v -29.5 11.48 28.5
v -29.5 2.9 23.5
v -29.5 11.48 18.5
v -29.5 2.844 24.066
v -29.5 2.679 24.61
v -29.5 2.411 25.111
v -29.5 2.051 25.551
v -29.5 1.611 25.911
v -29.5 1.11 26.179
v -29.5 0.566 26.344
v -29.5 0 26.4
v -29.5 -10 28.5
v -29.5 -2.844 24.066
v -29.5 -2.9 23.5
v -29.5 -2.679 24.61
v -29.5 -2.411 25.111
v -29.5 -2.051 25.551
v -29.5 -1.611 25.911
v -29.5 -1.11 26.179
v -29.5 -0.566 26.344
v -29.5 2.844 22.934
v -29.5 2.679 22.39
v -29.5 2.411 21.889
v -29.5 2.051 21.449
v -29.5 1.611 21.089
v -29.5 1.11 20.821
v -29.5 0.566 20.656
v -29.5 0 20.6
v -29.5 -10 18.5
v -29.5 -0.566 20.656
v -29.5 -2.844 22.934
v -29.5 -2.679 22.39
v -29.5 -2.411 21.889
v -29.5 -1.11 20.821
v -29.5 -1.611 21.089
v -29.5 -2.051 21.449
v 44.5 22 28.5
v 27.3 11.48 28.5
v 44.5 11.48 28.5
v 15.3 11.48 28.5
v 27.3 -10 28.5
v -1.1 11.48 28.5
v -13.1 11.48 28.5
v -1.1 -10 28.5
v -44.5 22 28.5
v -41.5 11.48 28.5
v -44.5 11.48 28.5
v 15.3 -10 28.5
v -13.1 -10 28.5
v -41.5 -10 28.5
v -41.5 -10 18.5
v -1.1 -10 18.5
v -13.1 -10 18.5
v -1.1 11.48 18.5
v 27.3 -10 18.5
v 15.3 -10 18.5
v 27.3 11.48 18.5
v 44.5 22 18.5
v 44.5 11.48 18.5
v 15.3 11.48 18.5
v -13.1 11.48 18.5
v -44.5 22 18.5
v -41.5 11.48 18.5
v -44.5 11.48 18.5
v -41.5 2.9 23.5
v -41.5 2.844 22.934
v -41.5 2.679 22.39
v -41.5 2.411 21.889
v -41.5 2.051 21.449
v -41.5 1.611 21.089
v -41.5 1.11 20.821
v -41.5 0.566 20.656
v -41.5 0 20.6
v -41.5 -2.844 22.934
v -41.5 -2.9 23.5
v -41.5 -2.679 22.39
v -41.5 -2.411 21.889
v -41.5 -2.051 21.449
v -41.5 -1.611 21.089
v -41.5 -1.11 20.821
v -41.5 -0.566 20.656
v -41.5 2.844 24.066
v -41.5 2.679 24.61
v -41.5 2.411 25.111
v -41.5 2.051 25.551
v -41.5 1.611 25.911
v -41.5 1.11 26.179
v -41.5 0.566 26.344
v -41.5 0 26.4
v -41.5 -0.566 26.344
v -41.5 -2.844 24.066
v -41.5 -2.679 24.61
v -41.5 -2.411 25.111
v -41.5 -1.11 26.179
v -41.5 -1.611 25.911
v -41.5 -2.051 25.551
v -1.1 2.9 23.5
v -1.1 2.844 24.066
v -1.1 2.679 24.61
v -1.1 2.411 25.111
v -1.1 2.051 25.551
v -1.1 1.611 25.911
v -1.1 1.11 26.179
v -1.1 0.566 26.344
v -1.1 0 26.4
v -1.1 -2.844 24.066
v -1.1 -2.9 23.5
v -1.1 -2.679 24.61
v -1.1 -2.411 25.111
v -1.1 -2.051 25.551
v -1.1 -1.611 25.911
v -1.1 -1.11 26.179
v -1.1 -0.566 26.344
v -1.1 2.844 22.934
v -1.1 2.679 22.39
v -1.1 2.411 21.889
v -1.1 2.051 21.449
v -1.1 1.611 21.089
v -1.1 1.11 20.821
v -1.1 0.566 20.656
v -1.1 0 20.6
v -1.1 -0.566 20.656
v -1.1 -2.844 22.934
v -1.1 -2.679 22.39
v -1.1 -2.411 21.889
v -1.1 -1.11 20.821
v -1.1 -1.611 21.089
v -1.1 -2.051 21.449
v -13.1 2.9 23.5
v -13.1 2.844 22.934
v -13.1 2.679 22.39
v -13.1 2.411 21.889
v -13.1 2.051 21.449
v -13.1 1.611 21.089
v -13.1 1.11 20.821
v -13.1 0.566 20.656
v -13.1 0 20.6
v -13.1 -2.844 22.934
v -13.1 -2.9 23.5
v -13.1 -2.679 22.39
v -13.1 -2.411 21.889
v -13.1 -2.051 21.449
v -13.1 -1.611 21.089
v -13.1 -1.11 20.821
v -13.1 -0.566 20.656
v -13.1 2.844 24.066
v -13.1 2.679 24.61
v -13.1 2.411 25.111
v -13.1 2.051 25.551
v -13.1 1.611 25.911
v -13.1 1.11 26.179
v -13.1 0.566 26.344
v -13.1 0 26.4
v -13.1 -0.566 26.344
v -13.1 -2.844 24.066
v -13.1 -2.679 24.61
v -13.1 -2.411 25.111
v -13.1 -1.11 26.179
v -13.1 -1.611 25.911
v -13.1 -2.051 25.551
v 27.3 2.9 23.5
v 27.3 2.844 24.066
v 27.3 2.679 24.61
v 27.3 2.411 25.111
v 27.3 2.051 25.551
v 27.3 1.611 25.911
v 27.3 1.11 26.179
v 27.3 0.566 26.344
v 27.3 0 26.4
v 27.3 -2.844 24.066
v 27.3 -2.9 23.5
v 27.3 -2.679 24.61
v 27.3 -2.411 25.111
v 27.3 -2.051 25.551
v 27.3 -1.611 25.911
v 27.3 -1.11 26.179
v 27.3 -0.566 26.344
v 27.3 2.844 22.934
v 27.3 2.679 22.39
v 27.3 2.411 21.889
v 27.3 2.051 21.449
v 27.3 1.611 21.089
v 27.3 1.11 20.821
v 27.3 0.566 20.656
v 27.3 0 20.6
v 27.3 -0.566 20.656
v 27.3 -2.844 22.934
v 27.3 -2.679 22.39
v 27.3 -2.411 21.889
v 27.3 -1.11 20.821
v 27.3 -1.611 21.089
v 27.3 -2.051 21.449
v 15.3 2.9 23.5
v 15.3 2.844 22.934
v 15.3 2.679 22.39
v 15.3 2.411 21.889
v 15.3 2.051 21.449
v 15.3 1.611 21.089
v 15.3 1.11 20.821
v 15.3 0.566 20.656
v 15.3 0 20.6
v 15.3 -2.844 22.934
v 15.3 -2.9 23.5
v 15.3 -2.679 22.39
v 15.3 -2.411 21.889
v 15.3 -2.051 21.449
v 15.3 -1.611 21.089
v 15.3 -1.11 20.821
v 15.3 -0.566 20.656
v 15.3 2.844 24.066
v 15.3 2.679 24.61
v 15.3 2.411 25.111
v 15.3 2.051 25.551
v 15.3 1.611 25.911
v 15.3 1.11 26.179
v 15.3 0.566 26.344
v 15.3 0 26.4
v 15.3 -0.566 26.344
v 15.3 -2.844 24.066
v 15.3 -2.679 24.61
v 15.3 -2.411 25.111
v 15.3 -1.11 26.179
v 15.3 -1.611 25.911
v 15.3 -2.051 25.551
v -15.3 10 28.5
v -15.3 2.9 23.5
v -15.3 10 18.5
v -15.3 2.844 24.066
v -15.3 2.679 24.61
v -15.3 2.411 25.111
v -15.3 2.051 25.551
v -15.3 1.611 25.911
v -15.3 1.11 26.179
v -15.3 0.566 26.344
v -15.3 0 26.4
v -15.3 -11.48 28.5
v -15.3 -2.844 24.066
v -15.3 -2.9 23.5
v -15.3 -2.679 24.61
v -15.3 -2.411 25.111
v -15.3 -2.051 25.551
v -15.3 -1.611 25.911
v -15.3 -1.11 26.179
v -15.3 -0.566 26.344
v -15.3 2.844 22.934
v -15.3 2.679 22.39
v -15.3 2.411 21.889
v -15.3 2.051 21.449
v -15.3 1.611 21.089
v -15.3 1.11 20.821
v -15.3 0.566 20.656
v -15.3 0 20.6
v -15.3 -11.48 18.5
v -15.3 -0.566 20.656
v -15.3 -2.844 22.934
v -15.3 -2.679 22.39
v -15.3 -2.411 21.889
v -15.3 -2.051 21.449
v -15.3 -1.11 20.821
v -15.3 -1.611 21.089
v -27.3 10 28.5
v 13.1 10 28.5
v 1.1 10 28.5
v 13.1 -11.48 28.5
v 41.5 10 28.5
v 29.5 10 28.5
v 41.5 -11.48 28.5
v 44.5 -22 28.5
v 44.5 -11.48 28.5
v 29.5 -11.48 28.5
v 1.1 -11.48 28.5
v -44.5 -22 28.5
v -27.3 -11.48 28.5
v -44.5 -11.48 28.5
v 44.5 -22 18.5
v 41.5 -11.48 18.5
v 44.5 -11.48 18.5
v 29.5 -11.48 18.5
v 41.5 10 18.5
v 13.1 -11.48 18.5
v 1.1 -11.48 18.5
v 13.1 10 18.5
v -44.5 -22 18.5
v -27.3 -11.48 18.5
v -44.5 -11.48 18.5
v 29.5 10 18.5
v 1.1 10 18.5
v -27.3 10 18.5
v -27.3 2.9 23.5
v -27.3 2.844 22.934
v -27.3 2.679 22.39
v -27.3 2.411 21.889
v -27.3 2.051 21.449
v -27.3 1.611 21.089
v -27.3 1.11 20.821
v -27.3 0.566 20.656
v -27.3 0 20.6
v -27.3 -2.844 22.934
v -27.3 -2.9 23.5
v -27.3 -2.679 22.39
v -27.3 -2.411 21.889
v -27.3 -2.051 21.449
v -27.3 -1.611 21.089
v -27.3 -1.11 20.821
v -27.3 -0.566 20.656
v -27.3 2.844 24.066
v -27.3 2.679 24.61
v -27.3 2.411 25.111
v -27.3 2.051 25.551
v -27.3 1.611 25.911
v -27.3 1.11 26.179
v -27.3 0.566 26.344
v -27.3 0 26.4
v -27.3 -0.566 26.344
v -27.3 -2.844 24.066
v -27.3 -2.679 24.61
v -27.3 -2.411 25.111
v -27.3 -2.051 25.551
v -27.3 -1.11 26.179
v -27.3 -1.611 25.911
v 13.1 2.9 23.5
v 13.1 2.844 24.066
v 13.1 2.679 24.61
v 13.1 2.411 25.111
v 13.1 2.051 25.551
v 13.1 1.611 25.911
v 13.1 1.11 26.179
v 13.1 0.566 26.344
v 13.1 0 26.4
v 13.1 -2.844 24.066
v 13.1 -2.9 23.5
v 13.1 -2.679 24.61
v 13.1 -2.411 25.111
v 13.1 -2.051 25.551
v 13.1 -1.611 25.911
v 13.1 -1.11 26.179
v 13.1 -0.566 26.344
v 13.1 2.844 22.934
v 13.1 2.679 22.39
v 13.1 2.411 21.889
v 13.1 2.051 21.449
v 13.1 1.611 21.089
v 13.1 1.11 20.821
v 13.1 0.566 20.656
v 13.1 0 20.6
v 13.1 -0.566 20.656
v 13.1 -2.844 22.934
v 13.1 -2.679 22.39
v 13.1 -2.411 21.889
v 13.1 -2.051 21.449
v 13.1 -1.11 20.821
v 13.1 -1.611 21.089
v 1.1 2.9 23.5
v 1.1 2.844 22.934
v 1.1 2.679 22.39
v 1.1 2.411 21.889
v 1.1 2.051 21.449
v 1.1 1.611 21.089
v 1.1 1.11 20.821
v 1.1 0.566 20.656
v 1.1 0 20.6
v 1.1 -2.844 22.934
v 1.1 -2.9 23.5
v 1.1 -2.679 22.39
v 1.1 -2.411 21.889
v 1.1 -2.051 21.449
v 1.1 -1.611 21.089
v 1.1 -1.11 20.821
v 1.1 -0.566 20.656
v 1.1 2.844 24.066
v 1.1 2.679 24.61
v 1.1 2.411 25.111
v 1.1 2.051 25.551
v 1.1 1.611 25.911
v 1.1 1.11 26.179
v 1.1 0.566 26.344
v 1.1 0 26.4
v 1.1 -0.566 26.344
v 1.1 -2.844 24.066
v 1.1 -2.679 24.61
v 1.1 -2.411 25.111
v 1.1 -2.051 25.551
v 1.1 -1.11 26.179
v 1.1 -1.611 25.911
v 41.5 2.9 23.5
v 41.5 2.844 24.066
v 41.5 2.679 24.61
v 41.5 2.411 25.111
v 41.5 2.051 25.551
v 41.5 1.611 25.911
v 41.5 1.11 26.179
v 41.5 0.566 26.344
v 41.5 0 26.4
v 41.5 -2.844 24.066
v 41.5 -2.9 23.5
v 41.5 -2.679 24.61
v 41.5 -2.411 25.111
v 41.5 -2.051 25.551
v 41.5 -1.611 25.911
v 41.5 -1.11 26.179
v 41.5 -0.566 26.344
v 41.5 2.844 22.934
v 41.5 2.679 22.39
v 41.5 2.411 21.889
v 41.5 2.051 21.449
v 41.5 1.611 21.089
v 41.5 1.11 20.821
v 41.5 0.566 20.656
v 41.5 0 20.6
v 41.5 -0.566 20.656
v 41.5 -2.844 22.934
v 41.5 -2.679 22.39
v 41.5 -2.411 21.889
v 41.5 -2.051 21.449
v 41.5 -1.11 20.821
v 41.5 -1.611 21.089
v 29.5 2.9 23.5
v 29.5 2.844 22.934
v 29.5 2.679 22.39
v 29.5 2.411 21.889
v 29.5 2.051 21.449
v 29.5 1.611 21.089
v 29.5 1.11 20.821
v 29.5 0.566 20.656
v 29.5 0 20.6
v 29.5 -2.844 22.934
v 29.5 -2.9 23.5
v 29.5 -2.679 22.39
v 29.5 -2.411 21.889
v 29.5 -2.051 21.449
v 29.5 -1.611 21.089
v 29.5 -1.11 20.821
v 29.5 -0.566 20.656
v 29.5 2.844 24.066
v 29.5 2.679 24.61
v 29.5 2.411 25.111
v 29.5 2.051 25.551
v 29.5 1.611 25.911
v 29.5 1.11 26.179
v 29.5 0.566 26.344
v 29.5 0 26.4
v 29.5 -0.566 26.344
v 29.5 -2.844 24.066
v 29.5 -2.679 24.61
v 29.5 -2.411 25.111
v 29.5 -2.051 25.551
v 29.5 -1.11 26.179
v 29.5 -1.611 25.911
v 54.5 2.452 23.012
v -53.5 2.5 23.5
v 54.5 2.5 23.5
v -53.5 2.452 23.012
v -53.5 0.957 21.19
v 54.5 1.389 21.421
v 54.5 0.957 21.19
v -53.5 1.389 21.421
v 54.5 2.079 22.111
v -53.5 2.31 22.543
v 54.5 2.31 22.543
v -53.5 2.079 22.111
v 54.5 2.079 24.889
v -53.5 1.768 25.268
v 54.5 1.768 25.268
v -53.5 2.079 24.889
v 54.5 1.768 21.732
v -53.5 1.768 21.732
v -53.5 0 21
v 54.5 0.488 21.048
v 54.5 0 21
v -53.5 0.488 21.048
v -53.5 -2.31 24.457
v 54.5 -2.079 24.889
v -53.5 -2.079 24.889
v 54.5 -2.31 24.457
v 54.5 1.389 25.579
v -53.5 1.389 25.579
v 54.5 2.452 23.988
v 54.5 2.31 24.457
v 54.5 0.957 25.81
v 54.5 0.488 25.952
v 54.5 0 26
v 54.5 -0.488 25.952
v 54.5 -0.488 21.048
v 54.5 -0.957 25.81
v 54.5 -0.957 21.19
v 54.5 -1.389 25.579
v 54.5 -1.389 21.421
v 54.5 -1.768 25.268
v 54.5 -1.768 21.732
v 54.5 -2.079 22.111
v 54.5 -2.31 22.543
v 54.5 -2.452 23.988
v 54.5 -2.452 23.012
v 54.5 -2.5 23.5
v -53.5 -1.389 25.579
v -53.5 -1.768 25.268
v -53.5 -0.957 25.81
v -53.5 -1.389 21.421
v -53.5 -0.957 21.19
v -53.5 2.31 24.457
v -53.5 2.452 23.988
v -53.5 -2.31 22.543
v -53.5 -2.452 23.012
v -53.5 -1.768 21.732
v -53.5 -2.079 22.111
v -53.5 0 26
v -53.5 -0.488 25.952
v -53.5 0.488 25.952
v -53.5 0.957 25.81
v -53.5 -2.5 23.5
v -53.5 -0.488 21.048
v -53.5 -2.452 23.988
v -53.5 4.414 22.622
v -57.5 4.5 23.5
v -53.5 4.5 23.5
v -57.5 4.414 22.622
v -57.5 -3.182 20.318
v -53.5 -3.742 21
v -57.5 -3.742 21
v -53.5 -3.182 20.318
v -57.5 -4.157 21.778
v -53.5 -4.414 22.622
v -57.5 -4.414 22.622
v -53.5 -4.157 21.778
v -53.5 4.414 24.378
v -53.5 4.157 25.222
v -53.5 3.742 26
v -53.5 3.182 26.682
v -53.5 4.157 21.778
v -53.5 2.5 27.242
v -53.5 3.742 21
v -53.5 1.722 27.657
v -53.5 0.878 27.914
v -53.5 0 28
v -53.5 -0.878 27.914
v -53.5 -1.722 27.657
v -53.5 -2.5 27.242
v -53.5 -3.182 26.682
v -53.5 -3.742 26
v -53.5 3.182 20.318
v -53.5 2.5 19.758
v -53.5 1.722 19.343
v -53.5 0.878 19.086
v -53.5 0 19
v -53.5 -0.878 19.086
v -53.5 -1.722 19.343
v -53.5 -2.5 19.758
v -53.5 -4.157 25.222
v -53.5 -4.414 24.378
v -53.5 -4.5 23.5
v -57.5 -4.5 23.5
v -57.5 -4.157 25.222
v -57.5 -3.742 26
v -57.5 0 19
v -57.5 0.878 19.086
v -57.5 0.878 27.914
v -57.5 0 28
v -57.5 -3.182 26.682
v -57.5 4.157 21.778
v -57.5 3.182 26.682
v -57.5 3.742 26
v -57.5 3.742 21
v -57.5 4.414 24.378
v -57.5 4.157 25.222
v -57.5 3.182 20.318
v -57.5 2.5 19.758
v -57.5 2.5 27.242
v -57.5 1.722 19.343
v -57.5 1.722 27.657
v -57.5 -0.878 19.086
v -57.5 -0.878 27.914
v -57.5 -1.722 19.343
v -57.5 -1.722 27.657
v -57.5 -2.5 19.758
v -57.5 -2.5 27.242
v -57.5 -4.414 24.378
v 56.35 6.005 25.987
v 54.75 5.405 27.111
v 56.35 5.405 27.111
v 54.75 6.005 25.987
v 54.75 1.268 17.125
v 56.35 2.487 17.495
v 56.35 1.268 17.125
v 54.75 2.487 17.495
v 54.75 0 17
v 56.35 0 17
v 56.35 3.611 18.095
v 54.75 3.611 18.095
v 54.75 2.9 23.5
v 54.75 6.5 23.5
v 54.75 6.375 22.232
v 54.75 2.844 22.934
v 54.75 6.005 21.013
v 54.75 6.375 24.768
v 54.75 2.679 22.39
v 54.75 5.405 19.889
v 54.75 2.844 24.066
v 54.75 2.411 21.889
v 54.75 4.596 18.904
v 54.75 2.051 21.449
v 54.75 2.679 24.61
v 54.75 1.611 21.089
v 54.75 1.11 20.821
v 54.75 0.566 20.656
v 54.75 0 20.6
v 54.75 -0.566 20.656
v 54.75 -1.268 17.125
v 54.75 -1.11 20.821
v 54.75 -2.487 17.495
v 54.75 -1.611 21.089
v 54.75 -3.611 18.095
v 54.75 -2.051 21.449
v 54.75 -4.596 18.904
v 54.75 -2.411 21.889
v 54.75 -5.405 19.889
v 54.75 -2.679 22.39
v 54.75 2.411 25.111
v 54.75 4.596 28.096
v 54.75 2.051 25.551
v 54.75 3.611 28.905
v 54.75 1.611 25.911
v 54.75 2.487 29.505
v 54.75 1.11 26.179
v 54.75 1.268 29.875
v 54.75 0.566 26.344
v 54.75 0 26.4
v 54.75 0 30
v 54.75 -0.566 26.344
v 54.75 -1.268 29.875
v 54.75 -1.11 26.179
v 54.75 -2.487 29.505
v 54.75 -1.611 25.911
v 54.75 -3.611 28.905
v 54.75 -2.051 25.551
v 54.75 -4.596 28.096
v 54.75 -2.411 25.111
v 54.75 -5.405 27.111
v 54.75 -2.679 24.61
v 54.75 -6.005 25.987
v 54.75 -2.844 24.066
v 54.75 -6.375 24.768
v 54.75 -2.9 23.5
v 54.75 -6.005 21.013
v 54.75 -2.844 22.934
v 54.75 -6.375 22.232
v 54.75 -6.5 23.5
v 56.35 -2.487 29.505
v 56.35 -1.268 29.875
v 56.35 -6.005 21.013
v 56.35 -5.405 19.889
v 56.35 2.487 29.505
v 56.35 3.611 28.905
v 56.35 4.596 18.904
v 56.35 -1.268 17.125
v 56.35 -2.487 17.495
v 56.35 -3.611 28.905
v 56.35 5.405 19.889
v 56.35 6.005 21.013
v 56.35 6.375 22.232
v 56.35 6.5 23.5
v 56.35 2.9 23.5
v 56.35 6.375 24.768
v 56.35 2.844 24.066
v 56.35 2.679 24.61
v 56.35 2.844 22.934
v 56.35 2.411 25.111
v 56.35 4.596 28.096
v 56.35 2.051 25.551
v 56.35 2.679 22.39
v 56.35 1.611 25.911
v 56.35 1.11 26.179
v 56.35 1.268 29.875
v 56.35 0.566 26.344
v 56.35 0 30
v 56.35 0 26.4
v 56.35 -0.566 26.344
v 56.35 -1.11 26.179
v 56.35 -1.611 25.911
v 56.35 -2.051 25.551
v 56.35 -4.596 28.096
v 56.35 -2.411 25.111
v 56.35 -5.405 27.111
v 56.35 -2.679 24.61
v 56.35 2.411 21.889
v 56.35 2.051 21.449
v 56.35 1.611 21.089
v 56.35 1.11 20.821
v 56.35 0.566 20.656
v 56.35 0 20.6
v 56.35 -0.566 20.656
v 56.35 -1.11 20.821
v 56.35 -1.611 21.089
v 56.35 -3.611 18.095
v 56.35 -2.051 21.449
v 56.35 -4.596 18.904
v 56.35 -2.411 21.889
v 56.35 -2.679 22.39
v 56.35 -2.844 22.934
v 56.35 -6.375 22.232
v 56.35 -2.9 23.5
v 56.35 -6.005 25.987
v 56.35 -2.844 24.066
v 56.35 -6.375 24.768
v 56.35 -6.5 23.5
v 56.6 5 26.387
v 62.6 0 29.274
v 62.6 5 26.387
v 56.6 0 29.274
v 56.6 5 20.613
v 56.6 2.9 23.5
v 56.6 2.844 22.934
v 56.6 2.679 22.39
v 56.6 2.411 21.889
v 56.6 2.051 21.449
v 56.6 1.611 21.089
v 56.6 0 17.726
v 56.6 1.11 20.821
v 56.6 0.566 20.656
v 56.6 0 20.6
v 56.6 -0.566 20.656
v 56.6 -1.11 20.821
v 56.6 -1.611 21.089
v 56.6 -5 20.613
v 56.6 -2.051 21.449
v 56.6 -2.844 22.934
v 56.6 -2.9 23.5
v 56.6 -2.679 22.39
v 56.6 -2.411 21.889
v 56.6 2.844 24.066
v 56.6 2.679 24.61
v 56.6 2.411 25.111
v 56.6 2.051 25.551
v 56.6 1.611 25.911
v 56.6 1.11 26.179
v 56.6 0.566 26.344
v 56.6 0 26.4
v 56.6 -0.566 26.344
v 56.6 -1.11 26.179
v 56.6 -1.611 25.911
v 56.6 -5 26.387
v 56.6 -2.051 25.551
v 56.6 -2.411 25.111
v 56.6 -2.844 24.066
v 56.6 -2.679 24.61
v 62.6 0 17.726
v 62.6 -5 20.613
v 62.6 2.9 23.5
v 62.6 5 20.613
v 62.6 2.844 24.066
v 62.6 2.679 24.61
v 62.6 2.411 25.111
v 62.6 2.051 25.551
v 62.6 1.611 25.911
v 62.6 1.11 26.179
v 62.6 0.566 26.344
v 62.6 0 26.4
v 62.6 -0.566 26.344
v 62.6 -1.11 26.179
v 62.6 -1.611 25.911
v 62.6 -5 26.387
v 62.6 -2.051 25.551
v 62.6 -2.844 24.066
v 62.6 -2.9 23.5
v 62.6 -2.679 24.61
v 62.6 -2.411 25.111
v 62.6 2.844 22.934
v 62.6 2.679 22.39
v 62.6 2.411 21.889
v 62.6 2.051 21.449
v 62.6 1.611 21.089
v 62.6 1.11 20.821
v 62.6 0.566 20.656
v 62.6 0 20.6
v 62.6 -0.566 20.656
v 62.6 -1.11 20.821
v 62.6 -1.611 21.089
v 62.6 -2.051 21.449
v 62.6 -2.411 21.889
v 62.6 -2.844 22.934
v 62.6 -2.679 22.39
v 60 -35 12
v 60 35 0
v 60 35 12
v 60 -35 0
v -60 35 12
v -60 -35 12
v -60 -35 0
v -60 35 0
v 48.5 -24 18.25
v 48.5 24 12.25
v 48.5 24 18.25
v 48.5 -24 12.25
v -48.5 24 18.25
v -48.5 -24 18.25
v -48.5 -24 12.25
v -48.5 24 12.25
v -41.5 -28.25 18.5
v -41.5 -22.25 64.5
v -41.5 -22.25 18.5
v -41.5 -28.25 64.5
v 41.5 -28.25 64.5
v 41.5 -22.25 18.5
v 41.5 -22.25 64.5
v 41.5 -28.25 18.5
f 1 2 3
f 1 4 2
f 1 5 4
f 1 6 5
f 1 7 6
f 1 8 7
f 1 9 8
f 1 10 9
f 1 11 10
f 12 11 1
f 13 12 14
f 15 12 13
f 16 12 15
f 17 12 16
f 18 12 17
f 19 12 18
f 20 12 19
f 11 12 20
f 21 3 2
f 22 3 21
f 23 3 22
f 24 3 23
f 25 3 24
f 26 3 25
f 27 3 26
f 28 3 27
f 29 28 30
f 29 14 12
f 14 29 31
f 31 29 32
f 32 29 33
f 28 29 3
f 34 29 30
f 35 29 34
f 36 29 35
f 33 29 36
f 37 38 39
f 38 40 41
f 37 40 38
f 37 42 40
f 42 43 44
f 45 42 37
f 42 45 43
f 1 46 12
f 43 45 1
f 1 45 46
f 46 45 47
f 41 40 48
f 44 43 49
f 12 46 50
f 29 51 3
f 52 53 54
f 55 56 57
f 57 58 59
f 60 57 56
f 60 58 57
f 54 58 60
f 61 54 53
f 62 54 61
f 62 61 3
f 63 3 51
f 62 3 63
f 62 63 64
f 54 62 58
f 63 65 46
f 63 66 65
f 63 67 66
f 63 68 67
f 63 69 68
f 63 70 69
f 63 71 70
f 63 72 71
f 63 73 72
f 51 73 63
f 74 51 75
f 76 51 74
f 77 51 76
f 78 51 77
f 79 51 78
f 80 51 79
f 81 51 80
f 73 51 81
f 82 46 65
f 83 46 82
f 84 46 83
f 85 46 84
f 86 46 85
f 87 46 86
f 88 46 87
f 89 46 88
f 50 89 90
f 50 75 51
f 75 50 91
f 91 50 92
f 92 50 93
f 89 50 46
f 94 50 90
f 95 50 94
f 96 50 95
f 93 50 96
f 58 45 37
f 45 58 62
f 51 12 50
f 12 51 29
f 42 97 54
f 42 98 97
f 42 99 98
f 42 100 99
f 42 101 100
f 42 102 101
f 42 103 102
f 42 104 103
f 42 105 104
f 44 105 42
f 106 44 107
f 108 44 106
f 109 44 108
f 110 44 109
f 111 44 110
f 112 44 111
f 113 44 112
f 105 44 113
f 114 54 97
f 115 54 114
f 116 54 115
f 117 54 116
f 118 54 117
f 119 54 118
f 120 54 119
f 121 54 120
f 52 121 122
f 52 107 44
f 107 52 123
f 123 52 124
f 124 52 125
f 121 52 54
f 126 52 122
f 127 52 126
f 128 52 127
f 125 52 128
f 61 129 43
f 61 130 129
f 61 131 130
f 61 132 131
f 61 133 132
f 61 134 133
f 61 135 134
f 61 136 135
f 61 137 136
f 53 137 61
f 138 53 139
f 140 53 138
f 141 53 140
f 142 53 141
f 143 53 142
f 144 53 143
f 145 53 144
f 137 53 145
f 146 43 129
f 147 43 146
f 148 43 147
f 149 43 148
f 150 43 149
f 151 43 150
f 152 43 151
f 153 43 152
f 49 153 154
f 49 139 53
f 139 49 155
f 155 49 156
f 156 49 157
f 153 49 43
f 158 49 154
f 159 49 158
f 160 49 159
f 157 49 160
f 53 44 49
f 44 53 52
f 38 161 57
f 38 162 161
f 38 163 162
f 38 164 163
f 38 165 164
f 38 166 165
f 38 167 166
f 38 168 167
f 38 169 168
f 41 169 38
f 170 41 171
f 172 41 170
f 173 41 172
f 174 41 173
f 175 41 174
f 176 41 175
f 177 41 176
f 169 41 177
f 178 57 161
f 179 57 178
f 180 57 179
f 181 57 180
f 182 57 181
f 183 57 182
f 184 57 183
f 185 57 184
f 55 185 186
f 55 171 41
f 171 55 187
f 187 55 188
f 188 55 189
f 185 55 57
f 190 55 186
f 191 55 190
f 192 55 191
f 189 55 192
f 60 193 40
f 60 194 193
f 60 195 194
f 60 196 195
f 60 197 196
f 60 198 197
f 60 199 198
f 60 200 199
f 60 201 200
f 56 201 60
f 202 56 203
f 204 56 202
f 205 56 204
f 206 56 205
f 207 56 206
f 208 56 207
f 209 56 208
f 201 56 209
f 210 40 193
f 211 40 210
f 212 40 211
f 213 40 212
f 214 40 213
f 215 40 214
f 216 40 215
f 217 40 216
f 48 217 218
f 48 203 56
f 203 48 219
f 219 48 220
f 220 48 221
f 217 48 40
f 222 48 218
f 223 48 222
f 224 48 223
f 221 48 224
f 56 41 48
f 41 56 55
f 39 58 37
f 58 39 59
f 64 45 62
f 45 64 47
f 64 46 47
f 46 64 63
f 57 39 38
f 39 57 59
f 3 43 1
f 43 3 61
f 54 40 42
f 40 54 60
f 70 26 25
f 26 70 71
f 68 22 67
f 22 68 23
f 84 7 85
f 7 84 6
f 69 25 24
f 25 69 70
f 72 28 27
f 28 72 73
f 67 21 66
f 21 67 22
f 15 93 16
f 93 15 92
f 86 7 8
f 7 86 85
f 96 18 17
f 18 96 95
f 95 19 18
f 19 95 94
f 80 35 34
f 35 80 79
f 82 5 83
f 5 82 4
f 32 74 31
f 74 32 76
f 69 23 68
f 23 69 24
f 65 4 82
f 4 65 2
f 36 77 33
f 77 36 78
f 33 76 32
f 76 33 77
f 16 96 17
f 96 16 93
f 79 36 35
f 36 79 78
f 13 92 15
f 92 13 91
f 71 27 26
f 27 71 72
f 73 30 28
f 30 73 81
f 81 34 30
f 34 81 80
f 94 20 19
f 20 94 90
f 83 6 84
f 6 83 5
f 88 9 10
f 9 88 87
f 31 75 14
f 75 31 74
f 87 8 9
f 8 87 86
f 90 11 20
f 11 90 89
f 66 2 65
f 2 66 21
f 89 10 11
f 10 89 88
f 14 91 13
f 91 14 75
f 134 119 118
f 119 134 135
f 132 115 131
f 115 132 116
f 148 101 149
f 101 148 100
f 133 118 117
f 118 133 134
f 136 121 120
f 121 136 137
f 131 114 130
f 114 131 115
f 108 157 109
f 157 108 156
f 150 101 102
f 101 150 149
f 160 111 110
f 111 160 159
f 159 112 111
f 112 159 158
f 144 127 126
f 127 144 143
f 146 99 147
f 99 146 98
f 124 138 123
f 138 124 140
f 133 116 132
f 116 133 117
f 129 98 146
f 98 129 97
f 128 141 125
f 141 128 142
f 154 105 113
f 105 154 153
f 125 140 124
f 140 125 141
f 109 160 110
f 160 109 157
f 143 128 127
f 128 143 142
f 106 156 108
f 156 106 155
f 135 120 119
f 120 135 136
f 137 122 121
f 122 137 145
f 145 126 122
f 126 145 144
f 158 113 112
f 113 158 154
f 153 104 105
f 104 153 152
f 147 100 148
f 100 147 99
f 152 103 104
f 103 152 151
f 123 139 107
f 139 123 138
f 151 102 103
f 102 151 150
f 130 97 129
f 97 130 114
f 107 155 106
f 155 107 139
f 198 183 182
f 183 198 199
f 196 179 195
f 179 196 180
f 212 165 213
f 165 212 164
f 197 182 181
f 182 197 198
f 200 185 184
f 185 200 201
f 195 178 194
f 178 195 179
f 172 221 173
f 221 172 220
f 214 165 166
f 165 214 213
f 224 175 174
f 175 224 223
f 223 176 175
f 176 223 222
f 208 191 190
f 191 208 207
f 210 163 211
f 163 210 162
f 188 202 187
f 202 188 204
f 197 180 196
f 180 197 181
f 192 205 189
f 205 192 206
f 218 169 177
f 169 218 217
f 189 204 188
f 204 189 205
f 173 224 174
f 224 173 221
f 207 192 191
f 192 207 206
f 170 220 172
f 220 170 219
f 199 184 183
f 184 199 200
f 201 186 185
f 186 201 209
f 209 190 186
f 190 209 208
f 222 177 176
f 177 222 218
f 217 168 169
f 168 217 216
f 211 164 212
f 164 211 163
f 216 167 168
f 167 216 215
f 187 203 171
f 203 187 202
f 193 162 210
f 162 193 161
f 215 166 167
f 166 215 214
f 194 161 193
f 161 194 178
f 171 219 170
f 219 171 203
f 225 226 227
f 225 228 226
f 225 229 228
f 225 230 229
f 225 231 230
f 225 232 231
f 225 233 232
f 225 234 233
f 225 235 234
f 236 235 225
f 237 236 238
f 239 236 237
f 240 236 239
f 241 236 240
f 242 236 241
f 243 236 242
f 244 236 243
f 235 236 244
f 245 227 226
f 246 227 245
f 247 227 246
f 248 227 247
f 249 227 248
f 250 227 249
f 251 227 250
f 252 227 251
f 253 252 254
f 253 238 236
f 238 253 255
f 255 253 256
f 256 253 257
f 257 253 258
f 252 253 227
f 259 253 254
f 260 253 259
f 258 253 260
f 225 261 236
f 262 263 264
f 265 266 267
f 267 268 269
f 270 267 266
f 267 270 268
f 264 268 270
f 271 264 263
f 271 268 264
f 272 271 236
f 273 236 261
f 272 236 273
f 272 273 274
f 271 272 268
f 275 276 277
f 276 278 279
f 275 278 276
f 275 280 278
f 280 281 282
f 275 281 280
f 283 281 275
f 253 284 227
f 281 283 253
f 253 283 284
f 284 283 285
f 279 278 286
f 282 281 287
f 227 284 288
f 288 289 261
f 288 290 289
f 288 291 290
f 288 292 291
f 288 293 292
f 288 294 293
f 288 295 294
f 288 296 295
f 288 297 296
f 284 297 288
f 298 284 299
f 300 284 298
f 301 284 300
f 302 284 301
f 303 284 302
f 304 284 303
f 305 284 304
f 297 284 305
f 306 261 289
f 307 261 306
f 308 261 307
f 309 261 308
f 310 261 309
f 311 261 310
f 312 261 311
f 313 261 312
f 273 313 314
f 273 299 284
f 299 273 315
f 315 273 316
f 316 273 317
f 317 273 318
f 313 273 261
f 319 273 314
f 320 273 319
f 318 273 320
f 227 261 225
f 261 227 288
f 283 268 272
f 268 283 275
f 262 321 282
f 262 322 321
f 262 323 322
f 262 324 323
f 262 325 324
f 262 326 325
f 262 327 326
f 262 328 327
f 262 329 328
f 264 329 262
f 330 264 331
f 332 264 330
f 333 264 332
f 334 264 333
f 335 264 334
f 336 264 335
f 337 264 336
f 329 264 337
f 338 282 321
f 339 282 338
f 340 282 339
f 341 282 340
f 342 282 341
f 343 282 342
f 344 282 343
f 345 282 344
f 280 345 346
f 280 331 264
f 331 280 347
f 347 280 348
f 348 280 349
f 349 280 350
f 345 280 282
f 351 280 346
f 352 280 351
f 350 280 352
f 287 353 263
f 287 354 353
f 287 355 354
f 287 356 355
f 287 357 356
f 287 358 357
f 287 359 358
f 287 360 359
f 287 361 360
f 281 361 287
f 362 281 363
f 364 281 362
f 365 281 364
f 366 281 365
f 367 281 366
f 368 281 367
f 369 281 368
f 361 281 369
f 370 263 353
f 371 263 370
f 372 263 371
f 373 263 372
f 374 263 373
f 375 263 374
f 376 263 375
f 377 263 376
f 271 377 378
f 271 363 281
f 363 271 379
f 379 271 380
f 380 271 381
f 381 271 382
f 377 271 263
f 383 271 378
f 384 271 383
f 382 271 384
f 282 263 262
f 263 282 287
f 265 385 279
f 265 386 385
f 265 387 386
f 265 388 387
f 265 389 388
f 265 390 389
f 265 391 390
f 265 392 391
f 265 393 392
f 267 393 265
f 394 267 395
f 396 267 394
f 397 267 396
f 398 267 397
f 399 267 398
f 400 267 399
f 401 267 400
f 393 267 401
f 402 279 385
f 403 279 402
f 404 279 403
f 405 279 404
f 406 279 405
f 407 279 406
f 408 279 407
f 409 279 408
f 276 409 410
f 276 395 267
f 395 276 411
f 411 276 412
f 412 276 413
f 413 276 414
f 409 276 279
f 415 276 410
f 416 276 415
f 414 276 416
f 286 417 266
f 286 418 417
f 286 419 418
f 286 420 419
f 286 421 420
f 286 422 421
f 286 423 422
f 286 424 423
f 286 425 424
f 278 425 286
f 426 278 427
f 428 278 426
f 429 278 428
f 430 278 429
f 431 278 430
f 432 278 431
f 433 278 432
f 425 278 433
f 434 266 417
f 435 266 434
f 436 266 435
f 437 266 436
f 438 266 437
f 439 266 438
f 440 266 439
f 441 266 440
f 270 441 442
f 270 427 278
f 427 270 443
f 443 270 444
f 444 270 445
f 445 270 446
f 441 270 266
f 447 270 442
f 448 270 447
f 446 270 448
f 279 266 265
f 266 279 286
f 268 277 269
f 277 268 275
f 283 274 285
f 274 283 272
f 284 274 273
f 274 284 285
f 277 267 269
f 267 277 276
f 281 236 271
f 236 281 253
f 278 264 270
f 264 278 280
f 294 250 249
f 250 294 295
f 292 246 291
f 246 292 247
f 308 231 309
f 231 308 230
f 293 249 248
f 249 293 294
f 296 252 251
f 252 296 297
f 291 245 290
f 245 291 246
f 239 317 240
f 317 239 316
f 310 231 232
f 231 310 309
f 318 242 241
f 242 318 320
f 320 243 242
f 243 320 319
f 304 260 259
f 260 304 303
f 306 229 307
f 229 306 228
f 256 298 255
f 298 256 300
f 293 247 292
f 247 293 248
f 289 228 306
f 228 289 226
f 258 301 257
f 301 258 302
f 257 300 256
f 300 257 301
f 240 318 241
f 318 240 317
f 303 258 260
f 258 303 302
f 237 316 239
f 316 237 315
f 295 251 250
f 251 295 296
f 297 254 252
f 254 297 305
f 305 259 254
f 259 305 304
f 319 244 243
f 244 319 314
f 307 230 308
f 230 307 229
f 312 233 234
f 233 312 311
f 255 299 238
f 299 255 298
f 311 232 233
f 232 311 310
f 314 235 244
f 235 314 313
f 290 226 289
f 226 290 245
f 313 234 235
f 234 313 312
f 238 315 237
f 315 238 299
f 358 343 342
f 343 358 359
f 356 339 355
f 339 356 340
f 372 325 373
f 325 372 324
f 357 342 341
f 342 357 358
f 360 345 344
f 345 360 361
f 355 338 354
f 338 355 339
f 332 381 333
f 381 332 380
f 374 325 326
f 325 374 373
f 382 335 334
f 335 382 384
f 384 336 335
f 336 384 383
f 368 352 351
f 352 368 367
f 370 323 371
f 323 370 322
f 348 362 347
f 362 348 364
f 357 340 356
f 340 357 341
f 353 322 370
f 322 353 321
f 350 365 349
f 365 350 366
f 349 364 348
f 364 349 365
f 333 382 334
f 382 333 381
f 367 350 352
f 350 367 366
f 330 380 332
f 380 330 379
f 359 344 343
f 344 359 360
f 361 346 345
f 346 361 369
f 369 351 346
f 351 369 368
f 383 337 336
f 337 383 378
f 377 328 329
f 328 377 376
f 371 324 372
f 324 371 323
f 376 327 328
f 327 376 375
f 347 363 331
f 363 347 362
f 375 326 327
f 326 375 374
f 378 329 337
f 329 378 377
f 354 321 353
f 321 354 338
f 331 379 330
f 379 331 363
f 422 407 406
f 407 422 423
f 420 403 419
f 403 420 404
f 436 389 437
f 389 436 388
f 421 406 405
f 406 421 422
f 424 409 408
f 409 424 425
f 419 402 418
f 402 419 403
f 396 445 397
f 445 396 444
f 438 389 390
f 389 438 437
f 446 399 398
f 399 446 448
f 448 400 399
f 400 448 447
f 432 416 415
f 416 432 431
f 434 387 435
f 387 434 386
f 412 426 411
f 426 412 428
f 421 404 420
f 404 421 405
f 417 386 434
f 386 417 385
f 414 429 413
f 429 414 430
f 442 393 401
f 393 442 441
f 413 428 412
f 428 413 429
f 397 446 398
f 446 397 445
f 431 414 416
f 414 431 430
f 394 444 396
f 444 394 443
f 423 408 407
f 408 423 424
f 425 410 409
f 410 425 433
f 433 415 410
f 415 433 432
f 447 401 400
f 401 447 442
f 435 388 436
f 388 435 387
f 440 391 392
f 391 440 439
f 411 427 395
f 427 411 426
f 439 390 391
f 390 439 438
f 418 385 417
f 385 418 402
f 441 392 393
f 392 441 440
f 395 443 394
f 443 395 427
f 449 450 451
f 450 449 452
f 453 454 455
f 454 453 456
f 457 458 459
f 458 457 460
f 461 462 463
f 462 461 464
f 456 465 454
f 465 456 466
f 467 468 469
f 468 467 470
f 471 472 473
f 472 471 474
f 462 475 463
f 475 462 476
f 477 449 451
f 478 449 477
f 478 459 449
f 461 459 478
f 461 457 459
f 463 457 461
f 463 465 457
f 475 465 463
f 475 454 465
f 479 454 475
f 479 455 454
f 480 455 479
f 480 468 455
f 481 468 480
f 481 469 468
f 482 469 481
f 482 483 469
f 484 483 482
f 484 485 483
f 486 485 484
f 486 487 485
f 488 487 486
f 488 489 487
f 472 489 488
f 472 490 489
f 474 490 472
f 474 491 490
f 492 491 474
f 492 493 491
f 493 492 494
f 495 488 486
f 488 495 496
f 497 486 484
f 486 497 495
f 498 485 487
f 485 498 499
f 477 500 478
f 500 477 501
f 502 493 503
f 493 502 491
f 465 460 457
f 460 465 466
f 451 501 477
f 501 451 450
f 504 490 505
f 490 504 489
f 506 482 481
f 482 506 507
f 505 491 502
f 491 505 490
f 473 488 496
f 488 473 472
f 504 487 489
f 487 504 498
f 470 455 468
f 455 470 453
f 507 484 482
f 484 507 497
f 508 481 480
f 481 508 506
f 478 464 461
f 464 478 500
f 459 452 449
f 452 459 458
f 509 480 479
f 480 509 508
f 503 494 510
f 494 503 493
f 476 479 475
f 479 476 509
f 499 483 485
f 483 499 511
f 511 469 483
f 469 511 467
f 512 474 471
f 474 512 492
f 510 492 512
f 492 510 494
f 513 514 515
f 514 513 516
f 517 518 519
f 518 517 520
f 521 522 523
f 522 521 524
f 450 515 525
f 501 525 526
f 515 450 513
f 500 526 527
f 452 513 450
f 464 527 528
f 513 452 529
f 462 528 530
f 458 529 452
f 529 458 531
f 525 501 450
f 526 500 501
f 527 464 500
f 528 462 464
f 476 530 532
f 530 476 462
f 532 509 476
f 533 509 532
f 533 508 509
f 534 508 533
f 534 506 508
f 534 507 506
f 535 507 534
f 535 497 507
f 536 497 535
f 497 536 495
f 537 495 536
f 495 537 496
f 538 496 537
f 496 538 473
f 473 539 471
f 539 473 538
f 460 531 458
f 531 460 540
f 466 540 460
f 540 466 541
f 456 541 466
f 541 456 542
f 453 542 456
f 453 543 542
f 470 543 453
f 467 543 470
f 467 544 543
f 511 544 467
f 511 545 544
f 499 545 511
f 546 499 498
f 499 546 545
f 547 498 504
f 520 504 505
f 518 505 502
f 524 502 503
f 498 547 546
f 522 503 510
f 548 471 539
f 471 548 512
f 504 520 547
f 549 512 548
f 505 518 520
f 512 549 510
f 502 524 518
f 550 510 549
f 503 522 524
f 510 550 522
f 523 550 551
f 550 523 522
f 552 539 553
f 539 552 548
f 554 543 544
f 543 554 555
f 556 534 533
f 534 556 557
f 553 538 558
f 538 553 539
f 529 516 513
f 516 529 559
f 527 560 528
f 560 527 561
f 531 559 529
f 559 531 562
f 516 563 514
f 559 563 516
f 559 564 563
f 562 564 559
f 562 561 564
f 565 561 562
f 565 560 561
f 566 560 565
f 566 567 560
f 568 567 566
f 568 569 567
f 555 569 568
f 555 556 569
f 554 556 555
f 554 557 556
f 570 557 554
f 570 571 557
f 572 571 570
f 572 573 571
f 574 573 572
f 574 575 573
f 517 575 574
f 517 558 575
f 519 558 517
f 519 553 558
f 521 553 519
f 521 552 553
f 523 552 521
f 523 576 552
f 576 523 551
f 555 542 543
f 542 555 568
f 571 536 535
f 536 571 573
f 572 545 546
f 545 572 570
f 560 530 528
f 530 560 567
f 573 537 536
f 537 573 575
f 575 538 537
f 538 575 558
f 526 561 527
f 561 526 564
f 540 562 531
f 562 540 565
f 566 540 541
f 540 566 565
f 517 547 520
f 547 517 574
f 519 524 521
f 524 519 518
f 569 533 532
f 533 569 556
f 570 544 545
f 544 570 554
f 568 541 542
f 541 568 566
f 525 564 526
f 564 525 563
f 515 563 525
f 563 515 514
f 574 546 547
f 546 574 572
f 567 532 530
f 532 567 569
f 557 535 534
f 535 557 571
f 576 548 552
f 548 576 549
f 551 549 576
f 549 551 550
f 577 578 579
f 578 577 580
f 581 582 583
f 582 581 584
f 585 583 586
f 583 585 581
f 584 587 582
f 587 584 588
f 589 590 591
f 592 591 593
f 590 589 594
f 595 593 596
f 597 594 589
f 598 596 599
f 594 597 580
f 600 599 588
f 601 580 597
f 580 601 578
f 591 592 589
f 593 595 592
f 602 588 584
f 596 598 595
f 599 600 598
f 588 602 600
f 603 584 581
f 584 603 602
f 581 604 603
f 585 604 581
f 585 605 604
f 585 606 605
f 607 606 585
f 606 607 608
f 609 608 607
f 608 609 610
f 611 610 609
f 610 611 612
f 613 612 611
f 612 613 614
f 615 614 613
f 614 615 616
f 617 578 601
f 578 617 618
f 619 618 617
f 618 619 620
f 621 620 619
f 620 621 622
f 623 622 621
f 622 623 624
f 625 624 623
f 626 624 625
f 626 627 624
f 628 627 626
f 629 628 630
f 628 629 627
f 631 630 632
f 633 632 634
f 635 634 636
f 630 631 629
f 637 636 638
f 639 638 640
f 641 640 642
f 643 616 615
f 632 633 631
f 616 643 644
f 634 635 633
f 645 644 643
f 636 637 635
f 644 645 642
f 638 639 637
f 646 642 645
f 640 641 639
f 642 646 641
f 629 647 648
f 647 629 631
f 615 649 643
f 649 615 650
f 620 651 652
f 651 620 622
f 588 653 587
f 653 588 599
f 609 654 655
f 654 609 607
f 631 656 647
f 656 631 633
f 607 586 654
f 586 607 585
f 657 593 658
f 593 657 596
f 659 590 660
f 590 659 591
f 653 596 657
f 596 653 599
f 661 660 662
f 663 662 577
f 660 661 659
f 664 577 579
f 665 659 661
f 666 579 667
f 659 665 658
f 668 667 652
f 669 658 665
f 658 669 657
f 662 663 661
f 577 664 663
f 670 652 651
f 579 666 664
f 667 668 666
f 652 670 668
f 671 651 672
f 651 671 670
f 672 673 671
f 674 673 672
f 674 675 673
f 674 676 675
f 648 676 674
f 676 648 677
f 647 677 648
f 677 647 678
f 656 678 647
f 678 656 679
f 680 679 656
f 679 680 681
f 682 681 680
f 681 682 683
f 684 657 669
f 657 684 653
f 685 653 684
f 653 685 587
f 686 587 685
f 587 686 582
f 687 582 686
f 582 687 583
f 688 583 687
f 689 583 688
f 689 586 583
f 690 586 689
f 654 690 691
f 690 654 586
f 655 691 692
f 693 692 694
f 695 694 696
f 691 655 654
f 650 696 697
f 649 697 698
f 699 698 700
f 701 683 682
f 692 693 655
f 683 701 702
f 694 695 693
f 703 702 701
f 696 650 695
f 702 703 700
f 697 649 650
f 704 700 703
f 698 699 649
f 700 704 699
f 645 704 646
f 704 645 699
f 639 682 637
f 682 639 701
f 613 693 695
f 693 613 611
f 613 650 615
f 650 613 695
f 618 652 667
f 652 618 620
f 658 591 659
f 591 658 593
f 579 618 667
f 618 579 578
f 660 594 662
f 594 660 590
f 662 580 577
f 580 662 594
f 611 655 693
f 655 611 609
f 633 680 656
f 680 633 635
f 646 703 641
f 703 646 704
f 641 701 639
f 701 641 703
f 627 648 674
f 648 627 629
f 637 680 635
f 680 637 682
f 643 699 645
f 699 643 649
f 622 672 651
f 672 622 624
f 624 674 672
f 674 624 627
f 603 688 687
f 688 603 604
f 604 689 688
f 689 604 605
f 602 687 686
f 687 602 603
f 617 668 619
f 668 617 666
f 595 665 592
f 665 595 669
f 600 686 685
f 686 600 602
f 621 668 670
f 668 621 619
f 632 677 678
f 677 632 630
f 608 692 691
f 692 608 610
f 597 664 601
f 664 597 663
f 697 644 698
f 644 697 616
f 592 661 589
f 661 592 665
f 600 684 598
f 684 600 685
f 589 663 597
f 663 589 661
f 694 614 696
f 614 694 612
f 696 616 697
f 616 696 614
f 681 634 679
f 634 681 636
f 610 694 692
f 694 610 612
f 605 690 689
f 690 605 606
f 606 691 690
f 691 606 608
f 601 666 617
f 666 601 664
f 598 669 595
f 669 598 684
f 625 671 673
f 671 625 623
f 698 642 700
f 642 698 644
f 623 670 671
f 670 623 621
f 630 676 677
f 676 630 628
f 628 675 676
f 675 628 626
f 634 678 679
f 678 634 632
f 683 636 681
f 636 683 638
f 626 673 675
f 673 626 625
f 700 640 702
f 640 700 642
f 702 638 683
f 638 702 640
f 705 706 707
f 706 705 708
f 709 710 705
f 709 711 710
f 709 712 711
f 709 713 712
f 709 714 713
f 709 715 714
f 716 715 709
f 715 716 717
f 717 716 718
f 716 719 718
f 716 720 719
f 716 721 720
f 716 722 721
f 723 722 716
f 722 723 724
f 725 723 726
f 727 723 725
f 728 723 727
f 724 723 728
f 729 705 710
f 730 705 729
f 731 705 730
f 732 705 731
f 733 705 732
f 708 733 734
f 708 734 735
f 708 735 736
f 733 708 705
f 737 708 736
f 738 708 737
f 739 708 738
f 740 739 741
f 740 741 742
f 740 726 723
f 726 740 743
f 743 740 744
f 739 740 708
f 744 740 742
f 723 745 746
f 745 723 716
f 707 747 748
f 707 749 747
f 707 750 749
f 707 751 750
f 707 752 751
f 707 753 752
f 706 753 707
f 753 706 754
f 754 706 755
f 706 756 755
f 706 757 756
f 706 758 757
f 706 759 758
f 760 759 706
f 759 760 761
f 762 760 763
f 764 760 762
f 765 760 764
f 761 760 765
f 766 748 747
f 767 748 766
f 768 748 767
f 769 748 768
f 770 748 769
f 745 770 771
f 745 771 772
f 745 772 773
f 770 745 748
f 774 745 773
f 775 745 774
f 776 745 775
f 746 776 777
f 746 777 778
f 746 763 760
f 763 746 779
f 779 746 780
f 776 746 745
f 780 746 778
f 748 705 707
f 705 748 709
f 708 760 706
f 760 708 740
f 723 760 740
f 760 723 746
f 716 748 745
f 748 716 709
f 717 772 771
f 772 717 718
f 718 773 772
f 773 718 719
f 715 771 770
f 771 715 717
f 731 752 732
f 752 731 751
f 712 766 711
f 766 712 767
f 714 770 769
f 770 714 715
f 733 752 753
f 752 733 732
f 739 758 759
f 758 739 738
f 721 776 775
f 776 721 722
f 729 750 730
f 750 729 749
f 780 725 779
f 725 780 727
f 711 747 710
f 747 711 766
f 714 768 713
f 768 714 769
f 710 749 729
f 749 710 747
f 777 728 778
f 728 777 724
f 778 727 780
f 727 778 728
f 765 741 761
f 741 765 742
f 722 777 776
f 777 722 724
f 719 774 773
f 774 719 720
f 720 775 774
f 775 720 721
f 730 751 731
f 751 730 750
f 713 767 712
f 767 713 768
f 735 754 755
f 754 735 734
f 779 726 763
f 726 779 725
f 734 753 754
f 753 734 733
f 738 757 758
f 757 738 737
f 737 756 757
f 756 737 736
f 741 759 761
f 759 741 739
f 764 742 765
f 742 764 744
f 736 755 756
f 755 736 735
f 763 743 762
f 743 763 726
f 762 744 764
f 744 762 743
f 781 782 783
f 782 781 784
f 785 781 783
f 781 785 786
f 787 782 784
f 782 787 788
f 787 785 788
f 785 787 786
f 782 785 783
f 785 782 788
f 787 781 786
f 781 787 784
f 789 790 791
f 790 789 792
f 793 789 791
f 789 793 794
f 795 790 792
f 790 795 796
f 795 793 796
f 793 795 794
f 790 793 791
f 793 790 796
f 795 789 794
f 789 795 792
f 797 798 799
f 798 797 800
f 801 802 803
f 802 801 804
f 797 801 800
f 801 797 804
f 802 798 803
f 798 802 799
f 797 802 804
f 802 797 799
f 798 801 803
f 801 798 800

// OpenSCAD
$fn = 32;

// ------------------------------------------------------------------------
// Comb hinge with flap: leaf 89 x 22 mm, pin d5, flap 46 mm
// Every part is its own module, assembly() places every instance.
// ------------------------------------------------------------------------

// --- part 1 ---
module hinge_bed() {
  difference() {
    translate([-60, -35, 0]) cube([120, 70, 12]);
  }
}

// --- part 2 ---
module hinge_riser() {
  difference() {
    translate([-48.5, -24, 0]) cube([97, 48, 6]);
  }
}

// --- part 3 ---
module hinge_leaf_a() {
  difference() {
    union() {
      translate([-41.5, -10, -5]) cube([12, 32, 10]);
      translate([-13.1, -10, -5]) cube([12, 32, 10]);
      translate([15.3, -10, -5]) cube([12, 32, 10]);
      translate([-44.5, 11.48, -5]) cube([89, 10.52, 10]);
    }
    translate([-35.5, 0, 0]) rotate([0, 90, 0]) cylinder(h = 14, d = 5.8, center = true);
    translate([-7.1, 0, 0]) rotate([0, 90, 0]) cylinder(h = 14, d = 5.8, center = true);
    translate([21.3, 0, 0]) rotate([0, 90, 0]) cylinder(h = 14, d = 5.8, center = true);
  }
}

// --- part 4 ---
module hinge_leaf_b() {
  difference() {
    union() {
      translate([-27.3, -22, -5]) cube([12, 32, 10]);
      translate([1.1, -22, -5]) cube([12, 32, 10]);
      translate([29.5, -22, -5]) cube([12, 32, 10]);
      translate([-44.5, -22, -5]) cube([89, 10.52, 10]);
    }
    translate([-21.3, 0, 0]) rotate([0, 90, 0]) cylinder(h = 14, d = 5.8, center = true);
    translate([7.1, 0, 0]) rotate([0, 90, 0]) cylinder(h = 14, d = 5.8, center = true);
    translate([35.5, 0, 0]) rotate([0, 90, 0]) cylinder(h = 14, d = 5.8, center = true);
  }
}

// --- part 5 ---
module hinge_flap() {
  difference() {
    translate([-41.5, -23, 0]) cube([83, 46, 6]);
  }
}

// --- part 6 ---
module hinge_pin() {
  rotate([0, 90, 0]) cylinder(h = 109, d = 5, center = true);
  translate([-57.5, 0, 0]) rotate([0, 90, 0]) cylinder(h = 4, d = 9);
}

// --- part 7 ---
module pin_washer() {
  difference() {
      translate([0, 0, 0]) cylinder(h = 1.6, d = 13);
      translate([0, 0, -1]) cylinder(h = 3.6, d = 5.8);
    }
}

// --- part 8 ---
module pin_nut() {
  difference() {
    linear_extrude(height = 6) polygon(points = [[5.774, 0], [2.887, 5], [-2.887, 5], [-5.774, 0], [-2.887, -5], [2.887, -5]]);
    translate([0, 0, -1]) cylinder(h = 8, d = 5.8);
  }
}

// --- assembly ---
module assembly() {
  color([0.80, 0.24, 0.20]) translate([0, 0, 0]) rotate([0, 0, 0]) hinge_bed();
  color([0.20, 0.45, 0.75]) translate([0, 0, 12.25]) rotate([0, 0, 0]) hinge_riser();
  color([0.25, 0.62, 0.32]) translate([0, 0, 23.5]) rotate([0, 0, 0]) hinge_leaf_a();
  color([0.92, 0.70, 0.18]) translate([0, 0, 23.5]) rotate([0, 0, 0]) hinge_leaf_b();
  color([0.58, 0.35, 0.70]) translate([0, -22.25, 41.5]) rotate([90, 0, 0]) hinge_flap();
  color([0.16, 0.66, 0.66]) translate([0, 0, 23.5]) rotate([0, 0, 0]) hinge_pin();
  color([0.85, 0.48, 0.18]) translate([54.75, 0, 23.5]) rotate([0, 90, 0]) pin_washer();
  color([0.55, 0.60, 0.65]) translate([56.6, 0, 23.5]) rotate([0, 90, 0]) pin_nut();
}

assembly();
